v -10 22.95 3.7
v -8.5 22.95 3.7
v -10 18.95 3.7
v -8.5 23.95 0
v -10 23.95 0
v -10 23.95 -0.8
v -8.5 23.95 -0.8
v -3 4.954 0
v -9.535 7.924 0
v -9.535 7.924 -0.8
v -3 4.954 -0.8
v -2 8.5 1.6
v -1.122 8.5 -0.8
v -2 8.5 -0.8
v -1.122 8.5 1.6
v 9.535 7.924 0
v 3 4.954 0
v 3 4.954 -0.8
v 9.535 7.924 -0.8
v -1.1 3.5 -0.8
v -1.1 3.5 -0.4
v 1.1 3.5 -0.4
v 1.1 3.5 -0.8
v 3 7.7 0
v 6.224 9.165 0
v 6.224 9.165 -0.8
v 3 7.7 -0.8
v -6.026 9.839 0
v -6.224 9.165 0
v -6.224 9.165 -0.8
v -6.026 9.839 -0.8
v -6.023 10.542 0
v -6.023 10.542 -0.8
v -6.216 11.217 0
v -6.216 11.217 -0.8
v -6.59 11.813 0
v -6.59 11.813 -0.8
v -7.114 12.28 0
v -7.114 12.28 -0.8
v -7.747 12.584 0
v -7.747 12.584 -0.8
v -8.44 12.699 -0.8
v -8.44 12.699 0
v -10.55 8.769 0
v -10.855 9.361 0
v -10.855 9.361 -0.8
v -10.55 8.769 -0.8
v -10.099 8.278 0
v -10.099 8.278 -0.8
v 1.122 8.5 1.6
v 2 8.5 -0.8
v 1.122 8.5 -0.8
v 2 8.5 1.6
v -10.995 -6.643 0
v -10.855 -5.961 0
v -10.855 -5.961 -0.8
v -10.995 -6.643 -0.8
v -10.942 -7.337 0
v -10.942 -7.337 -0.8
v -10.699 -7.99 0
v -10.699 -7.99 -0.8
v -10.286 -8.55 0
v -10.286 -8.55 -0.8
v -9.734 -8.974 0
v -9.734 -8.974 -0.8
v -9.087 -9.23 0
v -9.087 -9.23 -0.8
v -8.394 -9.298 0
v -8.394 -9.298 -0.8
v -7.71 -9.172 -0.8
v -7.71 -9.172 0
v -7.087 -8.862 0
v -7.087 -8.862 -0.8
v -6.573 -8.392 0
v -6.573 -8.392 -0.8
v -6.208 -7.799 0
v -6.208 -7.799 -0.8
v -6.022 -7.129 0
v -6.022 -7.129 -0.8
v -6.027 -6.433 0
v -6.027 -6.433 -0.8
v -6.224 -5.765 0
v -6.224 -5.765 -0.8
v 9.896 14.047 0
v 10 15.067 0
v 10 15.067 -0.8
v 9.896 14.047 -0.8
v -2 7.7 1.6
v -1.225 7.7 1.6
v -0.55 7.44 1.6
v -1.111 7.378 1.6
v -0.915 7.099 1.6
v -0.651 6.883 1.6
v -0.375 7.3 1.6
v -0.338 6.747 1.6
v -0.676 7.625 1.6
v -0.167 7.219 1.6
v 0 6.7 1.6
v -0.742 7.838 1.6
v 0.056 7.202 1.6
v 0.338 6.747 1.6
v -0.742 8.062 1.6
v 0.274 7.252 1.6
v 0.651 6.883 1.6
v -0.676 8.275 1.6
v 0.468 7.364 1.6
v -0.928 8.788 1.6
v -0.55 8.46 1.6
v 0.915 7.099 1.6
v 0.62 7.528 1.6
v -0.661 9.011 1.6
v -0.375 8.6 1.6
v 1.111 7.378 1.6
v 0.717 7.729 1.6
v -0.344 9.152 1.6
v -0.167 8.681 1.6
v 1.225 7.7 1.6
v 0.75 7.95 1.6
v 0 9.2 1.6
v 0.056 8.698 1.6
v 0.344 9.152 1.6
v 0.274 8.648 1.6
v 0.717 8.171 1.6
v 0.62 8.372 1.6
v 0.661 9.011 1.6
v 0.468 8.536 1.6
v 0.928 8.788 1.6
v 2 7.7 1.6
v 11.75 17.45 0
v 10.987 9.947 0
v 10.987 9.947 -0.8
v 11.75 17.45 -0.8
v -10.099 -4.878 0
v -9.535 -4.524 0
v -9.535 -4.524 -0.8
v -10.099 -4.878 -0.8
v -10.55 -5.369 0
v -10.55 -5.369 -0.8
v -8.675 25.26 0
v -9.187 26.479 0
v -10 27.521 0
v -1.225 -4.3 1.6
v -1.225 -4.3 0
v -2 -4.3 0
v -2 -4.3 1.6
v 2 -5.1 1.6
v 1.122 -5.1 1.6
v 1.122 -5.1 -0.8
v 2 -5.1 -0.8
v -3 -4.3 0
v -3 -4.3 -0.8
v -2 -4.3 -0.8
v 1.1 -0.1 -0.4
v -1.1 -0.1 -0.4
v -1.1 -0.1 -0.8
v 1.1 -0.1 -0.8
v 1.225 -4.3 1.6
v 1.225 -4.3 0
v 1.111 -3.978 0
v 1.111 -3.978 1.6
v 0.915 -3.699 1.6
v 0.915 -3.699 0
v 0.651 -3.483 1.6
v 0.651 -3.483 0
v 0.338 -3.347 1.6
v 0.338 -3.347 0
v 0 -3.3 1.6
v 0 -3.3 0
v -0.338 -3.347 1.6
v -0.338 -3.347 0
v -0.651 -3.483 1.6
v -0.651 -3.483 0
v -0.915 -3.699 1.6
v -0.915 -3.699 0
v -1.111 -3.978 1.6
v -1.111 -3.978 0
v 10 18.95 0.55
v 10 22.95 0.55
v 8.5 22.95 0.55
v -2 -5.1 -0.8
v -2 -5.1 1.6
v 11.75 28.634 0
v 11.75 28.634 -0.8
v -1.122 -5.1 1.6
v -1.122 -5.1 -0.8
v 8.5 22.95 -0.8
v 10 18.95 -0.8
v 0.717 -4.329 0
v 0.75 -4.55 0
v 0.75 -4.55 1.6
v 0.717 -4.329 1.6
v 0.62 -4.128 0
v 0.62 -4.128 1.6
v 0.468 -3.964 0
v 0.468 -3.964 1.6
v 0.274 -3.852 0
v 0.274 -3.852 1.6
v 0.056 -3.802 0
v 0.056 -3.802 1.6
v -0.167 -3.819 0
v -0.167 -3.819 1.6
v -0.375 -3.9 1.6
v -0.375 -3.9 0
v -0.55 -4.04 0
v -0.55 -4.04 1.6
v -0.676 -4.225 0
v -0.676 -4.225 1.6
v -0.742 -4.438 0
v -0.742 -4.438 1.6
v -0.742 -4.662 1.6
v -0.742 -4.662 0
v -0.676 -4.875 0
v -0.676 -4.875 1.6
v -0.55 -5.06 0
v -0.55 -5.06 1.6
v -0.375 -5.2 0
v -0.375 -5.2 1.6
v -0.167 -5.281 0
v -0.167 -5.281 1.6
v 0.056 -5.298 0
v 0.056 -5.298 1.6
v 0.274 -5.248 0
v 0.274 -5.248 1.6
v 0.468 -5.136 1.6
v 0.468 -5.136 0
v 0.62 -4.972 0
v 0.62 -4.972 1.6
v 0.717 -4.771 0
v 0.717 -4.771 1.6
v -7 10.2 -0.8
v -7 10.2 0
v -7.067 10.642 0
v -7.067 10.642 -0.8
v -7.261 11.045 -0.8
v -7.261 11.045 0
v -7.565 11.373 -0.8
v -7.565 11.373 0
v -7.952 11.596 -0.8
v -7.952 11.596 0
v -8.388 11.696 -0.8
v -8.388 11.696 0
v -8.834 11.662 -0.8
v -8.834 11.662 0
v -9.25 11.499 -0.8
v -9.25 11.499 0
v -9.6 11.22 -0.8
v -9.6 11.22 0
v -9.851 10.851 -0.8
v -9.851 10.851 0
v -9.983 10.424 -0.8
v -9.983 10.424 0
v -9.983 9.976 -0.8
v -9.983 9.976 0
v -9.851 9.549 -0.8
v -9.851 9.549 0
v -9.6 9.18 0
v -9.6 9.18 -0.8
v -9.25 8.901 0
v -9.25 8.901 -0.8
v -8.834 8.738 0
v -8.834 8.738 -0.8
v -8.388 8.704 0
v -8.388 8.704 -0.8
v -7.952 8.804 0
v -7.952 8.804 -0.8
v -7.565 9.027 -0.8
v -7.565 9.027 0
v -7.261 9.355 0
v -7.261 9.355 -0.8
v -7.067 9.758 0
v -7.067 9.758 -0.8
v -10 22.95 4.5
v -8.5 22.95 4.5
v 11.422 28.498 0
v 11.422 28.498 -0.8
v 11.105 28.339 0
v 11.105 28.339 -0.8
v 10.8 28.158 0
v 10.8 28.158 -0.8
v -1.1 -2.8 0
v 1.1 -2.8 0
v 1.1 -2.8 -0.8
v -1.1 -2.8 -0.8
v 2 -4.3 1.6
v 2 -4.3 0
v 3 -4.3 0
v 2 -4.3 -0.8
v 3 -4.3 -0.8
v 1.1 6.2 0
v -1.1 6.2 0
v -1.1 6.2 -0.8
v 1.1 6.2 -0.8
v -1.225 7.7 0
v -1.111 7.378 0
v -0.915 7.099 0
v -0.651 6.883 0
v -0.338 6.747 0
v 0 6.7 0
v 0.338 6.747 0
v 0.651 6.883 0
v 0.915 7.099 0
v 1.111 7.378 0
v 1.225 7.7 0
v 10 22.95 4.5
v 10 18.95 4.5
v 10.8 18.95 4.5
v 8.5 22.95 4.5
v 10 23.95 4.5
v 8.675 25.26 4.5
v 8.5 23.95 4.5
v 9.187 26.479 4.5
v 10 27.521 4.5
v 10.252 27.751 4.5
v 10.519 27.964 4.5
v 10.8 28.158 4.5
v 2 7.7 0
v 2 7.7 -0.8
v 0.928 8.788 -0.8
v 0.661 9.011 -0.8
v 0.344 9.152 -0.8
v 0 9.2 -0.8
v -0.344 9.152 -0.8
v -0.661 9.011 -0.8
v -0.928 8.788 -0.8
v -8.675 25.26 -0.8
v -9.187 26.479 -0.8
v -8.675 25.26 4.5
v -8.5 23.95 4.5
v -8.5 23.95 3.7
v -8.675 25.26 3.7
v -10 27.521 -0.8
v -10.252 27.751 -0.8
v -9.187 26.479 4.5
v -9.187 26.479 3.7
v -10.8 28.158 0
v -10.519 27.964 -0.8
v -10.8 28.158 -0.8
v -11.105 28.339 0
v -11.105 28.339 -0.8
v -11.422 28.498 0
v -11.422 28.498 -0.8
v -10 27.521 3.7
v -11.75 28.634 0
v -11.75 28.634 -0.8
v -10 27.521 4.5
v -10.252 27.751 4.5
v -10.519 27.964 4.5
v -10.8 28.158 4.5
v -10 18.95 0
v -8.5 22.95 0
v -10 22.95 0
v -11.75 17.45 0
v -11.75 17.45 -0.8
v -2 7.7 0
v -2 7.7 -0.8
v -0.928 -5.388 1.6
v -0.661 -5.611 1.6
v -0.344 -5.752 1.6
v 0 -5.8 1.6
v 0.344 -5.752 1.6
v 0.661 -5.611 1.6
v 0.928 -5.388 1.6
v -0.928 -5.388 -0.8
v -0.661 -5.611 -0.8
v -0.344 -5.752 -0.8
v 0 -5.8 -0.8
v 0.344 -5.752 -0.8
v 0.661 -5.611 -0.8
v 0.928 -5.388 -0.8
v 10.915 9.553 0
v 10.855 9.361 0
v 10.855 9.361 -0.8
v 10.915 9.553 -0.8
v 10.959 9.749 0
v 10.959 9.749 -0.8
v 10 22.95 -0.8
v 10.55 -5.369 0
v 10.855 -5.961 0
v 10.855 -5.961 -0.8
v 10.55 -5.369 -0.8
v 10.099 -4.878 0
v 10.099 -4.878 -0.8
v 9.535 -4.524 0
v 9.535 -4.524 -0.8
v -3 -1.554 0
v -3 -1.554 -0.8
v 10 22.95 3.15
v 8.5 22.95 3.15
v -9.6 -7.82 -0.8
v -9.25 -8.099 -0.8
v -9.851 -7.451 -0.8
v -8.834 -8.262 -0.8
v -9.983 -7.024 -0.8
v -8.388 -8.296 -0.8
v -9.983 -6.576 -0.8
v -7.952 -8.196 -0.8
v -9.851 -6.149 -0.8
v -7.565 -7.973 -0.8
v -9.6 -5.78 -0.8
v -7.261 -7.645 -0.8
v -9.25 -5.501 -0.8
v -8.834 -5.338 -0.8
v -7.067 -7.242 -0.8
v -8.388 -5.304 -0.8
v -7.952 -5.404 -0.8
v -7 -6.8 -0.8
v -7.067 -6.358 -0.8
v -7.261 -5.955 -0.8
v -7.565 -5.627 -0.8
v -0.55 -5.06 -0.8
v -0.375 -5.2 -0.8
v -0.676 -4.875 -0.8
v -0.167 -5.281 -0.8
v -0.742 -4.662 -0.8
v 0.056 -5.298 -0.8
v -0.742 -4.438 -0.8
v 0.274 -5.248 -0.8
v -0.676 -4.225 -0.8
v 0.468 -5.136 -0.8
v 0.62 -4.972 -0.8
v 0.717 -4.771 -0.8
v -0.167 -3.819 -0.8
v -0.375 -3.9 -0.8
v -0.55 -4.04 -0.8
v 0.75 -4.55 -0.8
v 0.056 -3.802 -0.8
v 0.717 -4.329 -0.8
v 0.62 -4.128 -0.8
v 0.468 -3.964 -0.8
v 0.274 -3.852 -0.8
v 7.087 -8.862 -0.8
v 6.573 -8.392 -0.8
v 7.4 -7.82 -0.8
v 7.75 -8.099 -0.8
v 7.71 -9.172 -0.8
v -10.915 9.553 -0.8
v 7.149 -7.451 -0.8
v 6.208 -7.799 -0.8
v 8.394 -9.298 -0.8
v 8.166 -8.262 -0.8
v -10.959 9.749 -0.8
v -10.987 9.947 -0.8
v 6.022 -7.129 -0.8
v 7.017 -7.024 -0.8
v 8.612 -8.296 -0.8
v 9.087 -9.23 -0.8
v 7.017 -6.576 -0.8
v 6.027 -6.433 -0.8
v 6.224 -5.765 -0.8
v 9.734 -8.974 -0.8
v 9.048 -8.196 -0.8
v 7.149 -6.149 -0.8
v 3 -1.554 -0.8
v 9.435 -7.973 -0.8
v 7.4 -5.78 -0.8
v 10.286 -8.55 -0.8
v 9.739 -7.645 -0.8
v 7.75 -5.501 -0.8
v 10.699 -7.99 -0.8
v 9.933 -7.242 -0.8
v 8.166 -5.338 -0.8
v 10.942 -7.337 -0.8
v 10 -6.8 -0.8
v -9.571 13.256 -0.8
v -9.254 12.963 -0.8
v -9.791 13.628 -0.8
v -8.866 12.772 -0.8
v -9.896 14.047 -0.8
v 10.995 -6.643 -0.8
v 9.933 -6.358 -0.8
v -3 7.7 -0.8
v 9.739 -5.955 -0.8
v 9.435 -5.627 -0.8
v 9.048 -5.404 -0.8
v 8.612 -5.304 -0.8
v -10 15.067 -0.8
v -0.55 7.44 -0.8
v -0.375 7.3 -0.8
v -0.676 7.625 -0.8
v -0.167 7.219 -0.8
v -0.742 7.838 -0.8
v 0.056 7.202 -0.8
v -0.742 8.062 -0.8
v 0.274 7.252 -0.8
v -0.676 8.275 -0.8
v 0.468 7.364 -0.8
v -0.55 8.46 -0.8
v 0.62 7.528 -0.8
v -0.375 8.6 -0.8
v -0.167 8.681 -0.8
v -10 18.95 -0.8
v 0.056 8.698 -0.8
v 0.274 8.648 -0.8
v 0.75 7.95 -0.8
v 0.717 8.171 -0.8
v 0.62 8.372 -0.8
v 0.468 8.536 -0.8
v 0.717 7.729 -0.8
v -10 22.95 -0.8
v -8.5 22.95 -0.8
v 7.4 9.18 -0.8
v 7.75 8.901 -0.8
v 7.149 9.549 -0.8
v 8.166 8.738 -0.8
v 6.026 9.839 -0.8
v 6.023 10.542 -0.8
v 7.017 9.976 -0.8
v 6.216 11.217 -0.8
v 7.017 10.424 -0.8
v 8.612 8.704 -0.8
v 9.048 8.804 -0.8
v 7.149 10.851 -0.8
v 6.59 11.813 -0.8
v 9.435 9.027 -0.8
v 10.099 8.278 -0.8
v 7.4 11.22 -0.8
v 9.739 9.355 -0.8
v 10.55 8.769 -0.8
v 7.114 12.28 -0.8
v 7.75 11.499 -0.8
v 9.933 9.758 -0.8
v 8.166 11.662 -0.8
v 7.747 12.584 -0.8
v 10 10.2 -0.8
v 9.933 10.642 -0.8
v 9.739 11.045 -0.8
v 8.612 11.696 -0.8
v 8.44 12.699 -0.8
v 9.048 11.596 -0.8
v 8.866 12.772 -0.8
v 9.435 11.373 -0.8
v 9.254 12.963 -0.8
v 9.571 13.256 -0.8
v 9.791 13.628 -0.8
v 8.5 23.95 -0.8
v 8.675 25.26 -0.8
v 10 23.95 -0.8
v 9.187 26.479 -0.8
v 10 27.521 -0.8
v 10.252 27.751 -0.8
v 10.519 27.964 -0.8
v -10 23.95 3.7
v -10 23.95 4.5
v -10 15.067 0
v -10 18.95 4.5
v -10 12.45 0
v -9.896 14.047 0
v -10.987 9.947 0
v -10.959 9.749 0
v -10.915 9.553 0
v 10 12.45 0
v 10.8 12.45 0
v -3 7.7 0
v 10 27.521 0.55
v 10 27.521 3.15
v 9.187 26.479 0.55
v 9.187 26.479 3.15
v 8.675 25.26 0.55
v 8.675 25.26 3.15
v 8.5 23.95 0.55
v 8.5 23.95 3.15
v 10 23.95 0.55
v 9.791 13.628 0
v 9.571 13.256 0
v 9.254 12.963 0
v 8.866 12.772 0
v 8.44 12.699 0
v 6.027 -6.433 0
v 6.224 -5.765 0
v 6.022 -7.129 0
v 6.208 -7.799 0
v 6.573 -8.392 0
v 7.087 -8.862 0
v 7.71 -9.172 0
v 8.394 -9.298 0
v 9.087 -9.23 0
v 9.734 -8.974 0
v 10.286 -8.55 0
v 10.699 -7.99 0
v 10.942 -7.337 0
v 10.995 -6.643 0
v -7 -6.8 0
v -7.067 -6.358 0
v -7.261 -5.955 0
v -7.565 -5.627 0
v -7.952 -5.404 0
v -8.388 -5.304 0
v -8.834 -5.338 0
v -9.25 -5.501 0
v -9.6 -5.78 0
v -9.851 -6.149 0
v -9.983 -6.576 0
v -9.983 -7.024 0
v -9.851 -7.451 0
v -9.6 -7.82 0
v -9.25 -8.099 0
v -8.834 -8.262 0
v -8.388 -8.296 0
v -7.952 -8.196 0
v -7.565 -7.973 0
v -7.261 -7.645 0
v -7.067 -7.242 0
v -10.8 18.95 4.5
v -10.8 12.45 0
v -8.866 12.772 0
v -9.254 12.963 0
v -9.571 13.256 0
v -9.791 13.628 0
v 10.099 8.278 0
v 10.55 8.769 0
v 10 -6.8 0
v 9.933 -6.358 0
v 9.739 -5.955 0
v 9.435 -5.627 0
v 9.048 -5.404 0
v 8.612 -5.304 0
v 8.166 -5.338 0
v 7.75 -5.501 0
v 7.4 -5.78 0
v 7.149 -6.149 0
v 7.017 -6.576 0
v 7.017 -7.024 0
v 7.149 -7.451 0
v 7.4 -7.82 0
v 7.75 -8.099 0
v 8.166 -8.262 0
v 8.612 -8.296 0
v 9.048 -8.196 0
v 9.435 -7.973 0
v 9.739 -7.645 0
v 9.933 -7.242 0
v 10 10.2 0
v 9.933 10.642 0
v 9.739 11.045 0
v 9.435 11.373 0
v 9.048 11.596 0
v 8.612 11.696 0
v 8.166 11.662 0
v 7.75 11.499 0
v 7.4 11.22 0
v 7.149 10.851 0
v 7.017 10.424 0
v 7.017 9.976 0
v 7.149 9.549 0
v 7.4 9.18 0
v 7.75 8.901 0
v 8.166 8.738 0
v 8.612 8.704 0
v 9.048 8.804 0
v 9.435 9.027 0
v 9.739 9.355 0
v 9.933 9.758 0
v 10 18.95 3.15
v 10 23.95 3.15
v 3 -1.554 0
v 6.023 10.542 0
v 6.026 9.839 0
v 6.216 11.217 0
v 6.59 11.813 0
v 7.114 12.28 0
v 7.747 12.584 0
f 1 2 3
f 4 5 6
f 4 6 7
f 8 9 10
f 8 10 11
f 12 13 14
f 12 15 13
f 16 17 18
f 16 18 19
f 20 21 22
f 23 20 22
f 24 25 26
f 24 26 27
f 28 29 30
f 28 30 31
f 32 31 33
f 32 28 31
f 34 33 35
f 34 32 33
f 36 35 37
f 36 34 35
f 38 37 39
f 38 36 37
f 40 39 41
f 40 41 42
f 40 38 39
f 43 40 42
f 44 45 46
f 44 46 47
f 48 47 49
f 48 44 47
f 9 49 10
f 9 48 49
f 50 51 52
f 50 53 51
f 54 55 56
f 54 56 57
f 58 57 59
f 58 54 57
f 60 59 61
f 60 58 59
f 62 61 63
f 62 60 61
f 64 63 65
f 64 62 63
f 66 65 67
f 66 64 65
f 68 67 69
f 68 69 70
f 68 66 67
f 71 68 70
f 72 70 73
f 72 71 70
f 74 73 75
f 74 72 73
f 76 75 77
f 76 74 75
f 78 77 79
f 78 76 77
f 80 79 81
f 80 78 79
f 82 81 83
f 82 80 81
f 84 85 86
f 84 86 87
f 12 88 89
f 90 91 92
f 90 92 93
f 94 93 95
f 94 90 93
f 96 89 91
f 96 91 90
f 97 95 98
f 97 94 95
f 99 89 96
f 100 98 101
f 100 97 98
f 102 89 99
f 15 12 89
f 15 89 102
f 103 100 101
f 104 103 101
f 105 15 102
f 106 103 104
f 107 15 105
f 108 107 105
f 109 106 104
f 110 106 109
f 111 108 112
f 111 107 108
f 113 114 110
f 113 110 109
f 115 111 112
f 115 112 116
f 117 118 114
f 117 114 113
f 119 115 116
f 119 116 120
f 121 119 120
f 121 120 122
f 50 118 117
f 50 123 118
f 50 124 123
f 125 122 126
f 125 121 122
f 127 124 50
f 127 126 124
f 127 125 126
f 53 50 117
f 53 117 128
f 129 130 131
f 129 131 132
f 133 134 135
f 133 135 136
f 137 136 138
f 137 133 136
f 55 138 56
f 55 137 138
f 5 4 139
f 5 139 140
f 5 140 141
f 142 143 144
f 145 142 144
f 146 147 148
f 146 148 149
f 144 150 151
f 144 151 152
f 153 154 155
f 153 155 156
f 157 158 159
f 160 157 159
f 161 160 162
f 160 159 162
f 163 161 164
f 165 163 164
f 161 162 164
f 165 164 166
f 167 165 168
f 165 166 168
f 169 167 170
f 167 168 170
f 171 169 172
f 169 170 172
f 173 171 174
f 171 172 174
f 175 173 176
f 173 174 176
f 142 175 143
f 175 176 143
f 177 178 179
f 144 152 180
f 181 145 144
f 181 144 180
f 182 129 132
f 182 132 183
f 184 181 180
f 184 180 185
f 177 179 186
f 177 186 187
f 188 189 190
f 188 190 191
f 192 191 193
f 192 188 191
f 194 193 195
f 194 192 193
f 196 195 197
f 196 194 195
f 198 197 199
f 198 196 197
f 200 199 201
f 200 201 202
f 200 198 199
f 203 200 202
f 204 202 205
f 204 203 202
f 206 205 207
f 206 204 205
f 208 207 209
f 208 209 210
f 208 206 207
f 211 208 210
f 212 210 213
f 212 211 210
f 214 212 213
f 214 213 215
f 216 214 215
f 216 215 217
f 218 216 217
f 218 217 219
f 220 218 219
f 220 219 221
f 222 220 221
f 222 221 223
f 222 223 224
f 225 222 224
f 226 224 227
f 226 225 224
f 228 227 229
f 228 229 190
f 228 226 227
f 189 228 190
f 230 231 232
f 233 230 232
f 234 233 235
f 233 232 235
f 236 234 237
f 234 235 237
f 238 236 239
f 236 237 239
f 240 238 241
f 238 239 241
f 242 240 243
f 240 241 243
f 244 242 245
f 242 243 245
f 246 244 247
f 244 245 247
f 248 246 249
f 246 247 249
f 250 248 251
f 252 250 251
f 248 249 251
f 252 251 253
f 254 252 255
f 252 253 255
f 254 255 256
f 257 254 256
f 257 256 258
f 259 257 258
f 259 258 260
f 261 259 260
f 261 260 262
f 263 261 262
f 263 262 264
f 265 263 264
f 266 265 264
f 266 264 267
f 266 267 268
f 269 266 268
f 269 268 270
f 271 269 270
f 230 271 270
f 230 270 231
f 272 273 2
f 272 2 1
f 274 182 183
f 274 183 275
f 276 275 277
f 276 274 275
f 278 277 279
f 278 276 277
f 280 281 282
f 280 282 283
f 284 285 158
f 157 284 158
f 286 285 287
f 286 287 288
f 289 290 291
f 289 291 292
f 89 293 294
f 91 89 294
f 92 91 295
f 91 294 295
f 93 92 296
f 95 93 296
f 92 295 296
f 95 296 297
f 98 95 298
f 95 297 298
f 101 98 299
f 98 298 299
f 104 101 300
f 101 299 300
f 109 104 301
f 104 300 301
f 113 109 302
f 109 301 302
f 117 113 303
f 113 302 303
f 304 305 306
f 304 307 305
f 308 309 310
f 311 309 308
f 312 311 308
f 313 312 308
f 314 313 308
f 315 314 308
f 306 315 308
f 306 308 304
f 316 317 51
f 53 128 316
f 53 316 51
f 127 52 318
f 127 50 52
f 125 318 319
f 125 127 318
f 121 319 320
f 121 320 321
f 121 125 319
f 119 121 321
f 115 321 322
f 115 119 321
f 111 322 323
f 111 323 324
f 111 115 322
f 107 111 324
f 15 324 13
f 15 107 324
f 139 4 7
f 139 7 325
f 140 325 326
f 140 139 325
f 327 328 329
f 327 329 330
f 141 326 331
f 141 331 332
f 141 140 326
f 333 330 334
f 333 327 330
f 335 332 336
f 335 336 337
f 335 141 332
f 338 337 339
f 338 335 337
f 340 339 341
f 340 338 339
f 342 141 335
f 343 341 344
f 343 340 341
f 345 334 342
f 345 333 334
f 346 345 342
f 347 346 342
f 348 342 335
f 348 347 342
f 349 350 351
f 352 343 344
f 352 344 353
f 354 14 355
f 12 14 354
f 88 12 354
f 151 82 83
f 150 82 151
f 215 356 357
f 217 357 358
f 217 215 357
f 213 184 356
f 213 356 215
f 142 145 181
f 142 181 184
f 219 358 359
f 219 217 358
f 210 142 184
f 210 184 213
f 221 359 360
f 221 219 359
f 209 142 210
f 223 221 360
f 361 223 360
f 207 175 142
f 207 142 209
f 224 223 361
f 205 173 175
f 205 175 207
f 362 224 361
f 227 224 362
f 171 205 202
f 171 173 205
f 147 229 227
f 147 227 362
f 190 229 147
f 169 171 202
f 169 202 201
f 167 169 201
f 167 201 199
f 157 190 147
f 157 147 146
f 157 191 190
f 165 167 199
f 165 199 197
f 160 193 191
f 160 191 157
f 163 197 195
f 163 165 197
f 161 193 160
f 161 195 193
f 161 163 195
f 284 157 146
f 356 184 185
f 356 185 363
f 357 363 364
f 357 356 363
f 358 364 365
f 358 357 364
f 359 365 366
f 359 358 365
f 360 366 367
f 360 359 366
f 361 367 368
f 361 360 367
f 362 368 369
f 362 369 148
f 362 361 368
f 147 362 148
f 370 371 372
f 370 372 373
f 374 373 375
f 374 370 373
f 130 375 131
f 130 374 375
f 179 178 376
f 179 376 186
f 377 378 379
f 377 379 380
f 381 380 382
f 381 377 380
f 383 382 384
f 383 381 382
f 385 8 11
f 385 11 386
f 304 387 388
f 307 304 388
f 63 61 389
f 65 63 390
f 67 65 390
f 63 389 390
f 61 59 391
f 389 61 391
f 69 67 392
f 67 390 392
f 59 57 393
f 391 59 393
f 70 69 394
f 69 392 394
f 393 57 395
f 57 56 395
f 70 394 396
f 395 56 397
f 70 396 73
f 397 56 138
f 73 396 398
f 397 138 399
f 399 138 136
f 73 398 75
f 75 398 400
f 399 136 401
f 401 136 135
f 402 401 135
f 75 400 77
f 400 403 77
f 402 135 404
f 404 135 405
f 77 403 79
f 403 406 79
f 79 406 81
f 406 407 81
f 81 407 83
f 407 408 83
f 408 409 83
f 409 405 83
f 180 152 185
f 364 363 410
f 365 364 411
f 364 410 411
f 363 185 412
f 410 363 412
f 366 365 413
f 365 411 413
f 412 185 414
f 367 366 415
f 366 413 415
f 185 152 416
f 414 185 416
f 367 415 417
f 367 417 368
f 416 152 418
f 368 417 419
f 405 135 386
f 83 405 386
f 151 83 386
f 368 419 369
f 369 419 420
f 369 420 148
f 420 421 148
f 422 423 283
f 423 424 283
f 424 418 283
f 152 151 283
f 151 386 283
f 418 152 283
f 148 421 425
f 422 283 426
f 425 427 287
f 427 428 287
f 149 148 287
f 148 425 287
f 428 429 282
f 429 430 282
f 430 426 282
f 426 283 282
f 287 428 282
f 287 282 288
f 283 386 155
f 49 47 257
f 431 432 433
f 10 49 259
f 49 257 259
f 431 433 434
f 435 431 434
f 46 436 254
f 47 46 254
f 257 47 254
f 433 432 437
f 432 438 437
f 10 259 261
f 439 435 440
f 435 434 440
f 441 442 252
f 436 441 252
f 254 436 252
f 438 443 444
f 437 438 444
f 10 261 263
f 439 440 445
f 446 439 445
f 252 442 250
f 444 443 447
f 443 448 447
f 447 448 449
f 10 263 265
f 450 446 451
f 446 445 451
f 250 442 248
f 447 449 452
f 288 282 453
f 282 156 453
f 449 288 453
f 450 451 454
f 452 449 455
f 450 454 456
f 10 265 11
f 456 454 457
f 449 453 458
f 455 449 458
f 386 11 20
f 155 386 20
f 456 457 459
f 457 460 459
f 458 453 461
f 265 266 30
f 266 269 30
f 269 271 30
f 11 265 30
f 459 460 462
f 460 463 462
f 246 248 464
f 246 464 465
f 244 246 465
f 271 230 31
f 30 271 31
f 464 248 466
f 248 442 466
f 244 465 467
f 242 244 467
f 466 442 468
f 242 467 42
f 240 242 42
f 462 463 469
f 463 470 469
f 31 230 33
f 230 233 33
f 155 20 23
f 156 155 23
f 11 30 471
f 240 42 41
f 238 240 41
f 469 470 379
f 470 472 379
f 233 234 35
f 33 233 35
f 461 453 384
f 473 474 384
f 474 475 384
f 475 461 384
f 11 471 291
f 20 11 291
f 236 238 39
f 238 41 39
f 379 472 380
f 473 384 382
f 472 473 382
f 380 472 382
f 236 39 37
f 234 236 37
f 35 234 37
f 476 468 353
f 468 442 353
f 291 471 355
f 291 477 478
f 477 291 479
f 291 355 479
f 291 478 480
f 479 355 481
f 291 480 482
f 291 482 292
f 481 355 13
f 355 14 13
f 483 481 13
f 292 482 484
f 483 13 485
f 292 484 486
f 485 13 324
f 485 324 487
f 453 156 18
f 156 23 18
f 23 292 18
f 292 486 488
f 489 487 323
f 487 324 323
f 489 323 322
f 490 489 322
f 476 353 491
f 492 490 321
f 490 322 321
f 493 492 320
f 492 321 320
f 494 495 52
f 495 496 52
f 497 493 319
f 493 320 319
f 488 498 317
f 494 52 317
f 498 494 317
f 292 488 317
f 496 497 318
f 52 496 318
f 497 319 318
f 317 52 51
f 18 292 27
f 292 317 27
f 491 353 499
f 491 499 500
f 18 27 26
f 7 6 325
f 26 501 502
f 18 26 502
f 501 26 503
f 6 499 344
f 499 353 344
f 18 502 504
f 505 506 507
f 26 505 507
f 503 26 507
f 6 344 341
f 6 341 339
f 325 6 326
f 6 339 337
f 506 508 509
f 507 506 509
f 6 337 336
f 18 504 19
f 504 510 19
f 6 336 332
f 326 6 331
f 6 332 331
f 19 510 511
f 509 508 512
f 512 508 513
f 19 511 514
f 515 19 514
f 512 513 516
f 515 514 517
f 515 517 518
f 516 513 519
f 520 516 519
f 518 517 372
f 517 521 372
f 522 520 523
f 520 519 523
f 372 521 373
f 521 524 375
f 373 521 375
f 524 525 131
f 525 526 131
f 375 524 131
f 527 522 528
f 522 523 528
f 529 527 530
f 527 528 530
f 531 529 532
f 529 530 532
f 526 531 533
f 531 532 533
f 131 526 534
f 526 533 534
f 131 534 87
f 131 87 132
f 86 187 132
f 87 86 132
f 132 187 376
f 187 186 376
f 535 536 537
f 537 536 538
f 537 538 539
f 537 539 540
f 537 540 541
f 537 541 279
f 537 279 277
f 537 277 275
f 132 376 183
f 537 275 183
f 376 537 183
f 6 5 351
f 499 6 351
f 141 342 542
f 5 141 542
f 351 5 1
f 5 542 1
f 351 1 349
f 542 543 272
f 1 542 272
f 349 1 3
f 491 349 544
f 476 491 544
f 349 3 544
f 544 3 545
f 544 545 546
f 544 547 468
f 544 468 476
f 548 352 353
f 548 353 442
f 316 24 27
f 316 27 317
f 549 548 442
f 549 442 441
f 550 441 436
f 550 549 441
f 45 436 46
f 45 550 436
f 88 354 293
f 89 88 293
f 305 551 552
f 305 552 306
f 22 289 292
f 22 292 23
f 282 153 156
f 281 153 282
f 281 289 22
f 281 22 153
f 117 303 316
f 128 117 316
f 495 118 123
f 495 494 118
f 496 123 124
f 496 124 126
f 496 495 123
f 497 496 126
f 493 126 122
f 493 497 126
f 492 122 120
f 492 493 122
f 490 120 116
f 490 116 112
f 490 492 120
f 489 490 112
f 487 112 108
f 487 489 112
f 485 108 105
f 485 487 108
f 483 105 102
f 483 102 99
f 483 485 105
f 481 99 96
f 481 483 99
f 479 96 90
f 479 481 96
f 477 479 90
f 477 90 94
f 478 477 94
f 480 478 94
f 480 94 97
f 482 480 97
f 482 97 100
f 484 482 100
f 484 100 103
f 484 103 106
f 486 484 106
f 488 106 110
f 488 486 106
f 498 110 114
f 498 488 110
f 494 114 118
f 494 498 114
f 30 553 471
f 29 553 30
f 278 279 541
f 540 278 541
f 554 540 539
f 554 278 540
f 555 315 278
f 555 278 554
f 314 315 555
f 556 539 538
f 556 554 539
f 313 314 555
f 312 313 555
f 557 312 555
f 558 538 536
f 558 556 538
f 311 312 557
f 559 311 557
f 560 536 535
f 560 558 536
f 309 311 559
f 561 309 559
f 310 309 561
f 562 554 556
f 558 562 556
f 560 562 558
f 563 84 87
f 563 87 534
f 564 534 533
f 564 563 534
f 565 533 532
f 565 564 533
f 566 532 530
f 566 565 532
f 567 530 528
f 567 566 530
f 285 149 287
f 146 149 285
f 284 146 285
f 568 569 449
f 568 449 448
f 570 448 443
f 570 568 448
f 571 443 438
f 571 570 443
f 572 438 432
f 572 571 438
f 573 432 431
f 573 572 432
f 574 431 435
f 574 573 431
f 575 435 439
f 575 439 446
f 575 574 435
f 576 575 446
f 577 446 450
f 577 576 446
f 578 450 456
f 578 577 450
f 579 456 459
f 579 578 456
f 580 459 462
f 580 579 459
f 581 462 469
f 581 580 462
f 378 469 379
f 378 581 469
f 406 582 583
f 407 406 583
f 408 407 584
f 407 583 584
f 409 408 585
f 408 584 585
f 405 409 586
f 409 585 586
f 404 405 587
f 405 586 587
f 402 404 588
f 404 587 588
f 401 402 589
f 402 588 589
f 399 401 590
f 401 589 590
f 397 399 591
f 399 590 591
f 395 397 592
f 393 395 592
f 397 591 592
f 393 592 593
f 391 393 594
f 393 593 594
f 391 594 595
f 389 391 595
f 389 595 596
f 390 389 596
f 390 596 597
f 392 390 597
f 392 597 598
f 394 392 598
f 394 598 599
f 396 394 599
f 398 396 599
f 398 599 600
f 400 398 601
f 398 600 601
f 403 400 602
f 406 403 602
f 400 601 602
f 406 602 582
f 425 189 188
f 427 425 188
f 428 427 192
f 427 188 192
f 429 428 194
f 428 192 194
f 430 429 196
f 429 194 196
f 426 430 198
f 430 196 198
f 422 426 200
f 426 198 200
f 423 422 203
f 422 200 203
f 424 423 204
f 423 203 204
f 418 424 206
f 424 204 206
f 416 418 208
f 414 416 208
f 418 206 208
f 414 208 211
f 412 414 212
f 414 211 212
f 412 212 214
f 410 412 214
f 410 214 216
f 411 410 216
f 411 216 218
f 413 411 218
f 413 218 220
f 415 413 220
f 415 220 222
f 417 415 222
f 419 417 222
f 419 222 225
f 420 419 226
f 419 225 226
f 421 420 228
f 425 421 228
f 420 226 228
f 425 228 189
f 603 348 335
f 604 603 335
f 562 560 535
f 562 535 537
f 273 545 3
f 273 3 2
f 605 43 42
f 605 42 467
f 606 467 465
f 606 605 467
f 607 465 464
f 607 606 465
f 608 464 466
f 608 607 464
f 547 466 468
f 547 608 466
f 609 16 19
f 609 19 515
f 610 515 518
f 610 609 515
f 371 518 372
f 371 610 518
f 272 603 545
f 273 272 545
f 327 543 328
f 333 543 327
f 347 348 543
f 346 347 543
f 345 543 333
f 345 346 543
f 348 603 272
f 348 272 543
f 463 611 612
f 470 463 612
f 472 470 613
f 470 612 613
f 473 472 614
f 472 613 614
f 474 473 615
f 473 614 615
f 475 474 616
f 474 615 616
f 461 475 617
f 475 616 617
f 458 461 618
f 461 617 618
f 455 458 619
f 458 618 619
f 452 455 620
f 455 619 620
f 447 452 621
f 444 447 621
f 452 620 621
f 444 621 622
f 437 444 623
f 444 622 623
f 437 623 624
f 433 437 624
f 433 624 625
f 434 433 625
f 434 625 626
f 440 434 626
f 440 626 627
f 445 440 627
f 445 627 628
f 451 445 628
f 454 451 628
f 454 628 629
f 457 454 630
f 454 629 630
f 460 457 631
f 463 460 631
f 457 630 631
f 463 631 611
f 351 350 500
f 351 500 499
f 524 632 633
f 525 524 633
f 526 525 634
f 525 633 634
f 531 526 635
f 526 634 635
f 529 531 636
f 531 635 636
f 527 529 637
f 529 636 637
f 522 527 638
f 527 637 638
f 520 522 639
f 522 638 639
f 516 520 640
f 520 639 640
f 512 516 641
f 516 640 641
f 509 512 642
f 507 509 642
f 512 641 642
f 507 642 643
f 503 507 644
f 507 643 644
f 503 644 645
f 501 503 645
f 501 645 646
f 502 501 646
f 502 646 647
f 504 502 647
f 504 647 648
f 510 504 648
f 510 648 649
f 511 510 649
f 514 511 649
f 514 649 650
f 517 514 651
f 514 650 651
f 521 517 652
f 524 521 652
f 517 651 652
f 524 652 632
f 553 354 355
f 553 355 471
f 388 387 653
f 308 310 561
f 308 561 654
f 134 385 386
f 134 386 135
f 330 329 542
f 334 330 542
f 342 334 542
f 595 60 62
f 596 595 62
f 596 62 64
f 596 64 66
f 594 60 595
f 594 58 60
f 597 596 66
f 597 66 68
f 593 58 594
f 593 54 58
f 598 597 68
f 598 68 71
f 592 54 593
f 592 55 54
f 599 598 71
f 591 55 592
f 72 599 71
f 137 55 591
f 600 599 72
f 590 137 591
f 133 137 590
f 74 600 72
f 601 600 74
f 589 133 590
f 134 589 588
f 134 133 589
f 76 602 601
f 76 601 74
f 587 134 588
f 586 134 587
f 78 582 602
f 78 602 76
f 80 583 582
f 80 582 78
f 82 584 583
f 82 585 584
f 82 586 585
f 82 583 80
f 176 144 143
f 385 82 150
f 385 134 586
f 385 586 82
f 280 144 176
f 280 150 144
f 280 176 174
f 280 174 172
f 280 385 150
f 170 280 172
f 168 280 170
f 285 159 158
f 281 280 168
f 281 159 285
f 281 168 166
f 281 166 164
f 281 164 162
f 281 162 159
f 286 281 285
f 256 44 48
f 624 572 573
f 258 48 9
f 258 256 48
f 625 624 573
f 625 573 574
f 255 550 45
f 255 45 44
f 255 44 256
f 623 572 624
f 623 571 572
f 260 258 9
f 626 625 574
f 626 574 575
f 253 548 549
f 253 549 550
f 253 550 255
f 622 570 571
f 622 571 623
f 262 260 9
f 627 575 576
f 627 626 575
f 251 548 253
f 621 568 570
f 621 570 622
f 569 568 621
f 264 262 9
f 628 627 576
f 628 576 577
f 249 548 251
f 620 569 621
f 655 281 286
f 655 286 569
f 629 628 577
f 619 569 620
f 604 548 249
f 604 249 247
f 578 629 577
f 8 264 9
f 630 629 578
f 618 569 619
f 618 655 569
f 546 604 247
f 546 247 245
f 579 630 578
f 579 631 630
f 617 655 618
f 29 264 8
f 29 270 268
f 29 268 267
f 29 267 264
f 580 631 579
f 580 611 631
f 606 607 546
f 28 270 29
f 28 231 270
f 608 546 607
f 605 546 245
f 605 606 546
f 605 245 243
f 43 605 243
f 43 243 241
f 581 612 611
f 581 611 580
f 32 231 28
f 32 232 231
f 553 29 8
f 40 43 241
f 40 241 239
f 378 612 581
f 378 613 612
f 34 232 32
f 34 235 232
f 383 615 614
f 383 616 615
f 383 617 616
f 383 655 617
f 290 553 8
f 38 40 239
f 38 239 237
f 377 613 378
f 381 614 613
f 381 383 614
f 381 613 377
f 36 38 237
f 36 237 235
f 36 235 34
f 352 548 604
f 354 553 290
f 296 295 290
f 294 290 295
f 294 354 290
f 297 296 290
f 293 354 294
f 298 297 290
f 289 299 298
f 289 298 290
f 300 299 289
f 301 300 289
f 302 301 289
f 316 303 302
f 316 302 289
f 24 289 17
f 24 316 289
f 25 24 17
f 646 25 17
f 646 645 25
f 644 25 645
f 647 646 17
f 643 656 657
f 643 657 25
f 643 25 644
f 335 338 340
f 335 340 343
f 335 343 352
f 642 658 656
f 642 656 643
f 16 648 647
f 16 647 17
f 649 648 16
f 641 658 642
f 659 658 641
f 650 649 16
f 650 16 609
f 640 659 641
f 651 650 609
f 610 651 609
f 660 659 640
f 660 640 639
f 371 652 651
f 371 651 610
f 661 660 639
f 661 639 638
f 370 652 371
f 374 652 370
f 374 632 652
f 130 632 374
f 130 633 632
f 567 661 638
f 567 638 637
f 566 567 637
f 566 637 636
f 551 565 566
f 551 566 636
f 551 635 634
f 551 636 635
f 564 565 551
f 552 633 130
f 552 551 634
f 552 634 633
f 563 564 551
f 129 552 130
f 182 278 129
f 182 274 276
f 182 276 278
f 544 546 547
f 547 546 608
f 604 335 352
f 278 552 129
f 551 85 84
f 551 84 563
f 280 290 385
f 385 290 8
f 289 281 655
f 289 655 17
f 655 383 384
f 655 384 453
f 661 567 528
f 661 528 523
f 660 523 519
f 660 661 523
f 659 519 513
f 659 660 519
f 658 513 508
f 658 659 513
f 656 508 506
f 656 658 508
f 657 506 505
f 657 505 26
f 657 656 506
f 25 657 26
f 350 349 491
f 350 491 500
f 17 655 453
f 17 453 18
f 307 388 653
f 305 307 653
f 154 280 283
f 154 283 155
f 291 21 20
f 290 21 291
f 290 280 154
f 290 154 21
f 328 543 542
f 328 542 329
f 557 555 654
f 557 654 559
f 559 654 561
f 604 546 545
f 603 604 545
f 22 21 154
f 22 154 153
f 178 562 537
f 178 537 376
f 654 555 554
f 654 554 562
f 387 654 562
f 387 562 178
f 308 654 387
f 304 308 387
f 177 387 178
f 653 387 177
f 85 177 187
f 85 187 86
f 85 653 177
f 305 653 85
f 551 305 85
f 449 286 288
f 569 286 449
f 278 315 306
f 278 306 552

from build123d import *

# Parameters (mm, degrees)
F0_W          = 2.2
F0_H          = 3.6
F1_DEPTH      = 0.8
F0_R          = 0.75
F2_DEPTH      = 1.6
F2_DEPTH_BACK = 0.8
F3_DEPTH      = 0.4
F0_R_2        = 1.5
F4_DEPTH      = 0.8
F5_DEPTH      = 4.5
F5_DEPTH_BACK = 0.8
F6_W          = 1.5
F6_H          = 3.7
F6_H_2        = 2.6
F7_DEPTH      = 25
F7_DEPTH_BACK = 25
F9_DEPTH      = 0.8


# Not quite as in the source:
# - a feature of the source that left no trace in its solid (it failed there, or was rolled back) is left out
# - a pattern or mirror of a feature is missing from the dataset's text; its kind, count and spacing are read off the source's solid


with BuildPart() as f1:
    # F0 (on Top) → F1 (new body)
    with BuildSketch(Plane.XY):
        with BuildLine():
            Line((2, 7.6999996733), (1.2247448714, 7.6999996733))
            ThreePointArc((1.2247448714, 7.6999996733), (0, 6.6999996733), (-1.2247448714, 7.6999996733))
            Line((-1.2247448714, 7.6999996733), (-2, 7.6999996733))
            Line((-2, 7.6999996733), (-3, 7.6999996733))
            Line((-3, 7.6999996733), (-6.2240838063, 9.1654923125))
            ThreePointArc((-6.2240838063, 9.1654923125), (-7.622191396, 7.8591767294), (-9.5345073608, 7.9240834796))
            Line((-9.5345073608, 7.9240834796), (-3, 4.9538528611))
            Line((-3, 4.9538528611), (-3, -1.5538535145))
            Line((-3, -1.5538535145), (-9.5345073608, -4.5240841331))
            ThreePointArc((-9.5345073608, -4.5240841331), (-7.622191396, -4.4591773828), (-6.2240838063, -5.765492966))
            Line((-6.2240838063, -5.765492966), (-3, -4.3000003267))
            Line((-3, -4.3000003267), (-2, -4.3000003267))
            Line((-2, -4.3000003267), (-1.2247448714, -4.3000003267))
            ThreePointArc((-1.2247448714, -4.3000003267), (0, -3.3000003267), (1.2247448714, -4.3000003267))
            Line((1.2247448714, -4.3000003267), (2, -4.3000003267))
            Line((2, -4.3000003267), (3, -4.3000003267))
            Line((3, -4.3000003267), (6.2240838063, -5.765492966))
            ThreePointArc((6.2240838063, -5.765492966), (7.622191396, -4.4591773828), (9.5345073608, -4.5240841331))
            Line((9.5345073608, -4.5240841331), (3, -1.5538535145))
            Line((3, -1.5538535145), (3, 4.9538528611))
            Line((3, 4.9538528611), (9.5345073608, 7.9240834796))
            ThreePointArc((9.5345073608, 7.9240834796), (7.622191396, 7.8591767294), (6.2240838063, 9.1654923125))
            Line((6.2240838063, 9.1654923125), (3, 7.6999996733))
            Line((3, 7.6999996733), (2, 7.6999996733))
        make_face()
        Polygon((-1.1, 3.4999996733), (-1.1, 6.1999996733), (1.1, 6.1999996733), (1.1, 3.4999996733), (1.1, -0.1000003267), (1.1, -2.8000003267), (-1.1, -2.8000003267), (-1.1, -0.1000003267), align=None, mode=Mode.SUBTRACT)
        with Locations((0, 1.6999996733)):
            Rectangle(F0_W, F0_H)
    extrude(amount=-F1_DEPTH)

    # F0 (on Top) → F2 (join, two sides)
    with BuildSketch(Plane.XY) as f2_sk:
        with BuildLine():
            ThreePointArc((-1.2247448714, 7.6999996733), (-1.2399138495, 8.1084725282), (-1.122497216, 8.4999996733))
            Line((-1.122497216, 8.4999996733), (-2, 8.4999996733))
            Line((-2, 8.4999996733), (-2, 7.6999996733))
            Line((-2, 7.6999996733), (-1.2247448714, 7.6999996733))
        make_face()
        with BuildLine():
            ThreePointArc((1.2247448714, 7.6999996733), (1.2436701913, 7.8243634708), (1.25, 7.9499996733))
            ThreePointArc((1.25, 7.9499996733), (1.2177071733, 8.2322924999), (1.122497216, 8.4999996733))
            ThreePointArc((1.122497216, 8.4999996733), (0, 9.1999996733), (-1.122497216, 8.4999996733))
            ThreePointArc((-1.122497216, 8.4999996733), (-1.2399138495, 8.1084725282), (-1.2247448714, 7.6999996733))
            ThreePointArc((-1.2247448714, 7.6999996733), (0, 6.6999996733), (1.2247448714, 7.6999996733))
        make_face()
        with Locations((0, 7.9499996733)):
            Circle(F0_R, mode=Mode.SUBTRACT)
        with BuildLine():
            ThreePointArc((1.122497216, 8.4999996733), (1.2177071733, 8.2322924999), (1.25, 7.9499996733))
            ThreePointArc((1.25, 7.9499996733), (1.2436701913, 7.8243634708), (1.2247448714, 7.6999996733))
            Line((1.2247448714, 7.6999996733), (2, 7.6999996733))
            Line((2, 7.6999996733), (2, 8.4999996733))
            Line((2, 8.4999996733), (1.122497216, 8.4999996733))
        make_face()
        with BuildLine():
            Line((-1.2247448714, -4.3000003267), (-2, -4.3000003267))
            Line((-2, -4.3000003267), (-2, -5.1000003267))
            Line((-2, -5.1000003267), (-1.122497216, -5.1000003267))
            ThreePointArc((-1.122497216, -5.1000003267), (-1.2399138495, -4.7084731817), (-1.2247448714, -4.3000003267))
        make_face()
        with BuildLine():
            ThreePointArc((1.25, -4.5500003267), (1.2436701913, -4.4243641242), (1.2247448714, -4.3000003267))
            ThreePointArc((1.2247448714, -4.3000003267), (0, -3.3000003267), (-1.2247448714, -4.3000003267))
            ThreePointArc((-1.2247448714, -4.3000003267), (-1.2399138495, -4.7084731817), (-1.122497216, -5.1000003267))
            ThreePointArc((-1.122497216, -5.1000003267), (0, -5.8000003267), (1.122497216, -5.1000003267))
            ThreePointArc((1.122497216, -5.1000003267), (1.2177071733, -4.8322931534), (1.25, -4.5500003267))
        make_face()
        with Locations((0, -4.5500003267)):
            Circle(F0_R, mode=Mode.SUBTRACT)
        with BuildLine():
            Line((2, -5.1000003267), (2, -4.3000003267))
            Line((2, -4.3000003267), (1.2247448714, -4.3000003267))
            ThreePointArc((1.2247448714, -4.3000003267), (1.2436701913, -4.4243641242), (1.25, -4.5500003267))
            ThreePointArc((1.25, -4.5500003267), (1.2177071733, -4.8322931534), (1.122497216, -5.1000003267))
            Line((1.122497216, -5.1000003267), (2, -5.1000003267))
        make_face()
    extrude(amount=F2_DEPTH)
    extrude(f2_sk.sketch, amount=-F2_DEPTH_BACK)

    # F0 (on Top) → F3 (cut)
    with BuildSketch(Plane.XY):
        with Locations((0, 1.6999996733)):
            Rectangle(F0_W, F0_H)
    extrude(amount=-F3_DEPTH, mode=Mode.SUBTRACT)

    # F0 (on Top) → F4 (join)
    with BuildSketch(Plane.XY):
        with BuildLine():
            ThreePointArc((-9.5345073608, 7.9240834796), (-7.622191396, 7.8591767294), (-6.2240838063, 9.1654923125))
            ThreePointArc((-6.2240838063, 9.1654923125), (-6.3819707707, 11.5281382895), (-8.4399923541, 12.699279386))
            ThreePointArc((-8.4399923541, 12.699279386), (-10.3347684576, 11.8981235519), (-10.987178172, 9.9471266996))
            ThreePointArc((-10.987178172, 9.9471266996), (-10.9388236249, 9.6503276559), (-10.8551830715, 9.3614815161))
            ThreePointArc((-10.8551830715, 9.3614815161), (-10.3409314451, 8.5085590404), (-9.5345073608, 7.9240834796))
        make_face()
        with Locations((-8.5, 10.1999996733)):
            Circle(F0_R_2, mode=Mode.SUBTRACT)
        with BuildLine():
            ThreePointArc((8.4399923541, 12.699279386), (6.3819707707, 11.5281382895), (6.2240838063, 9.1654923125))
            ThreePointArc((6.2240838063, 9.1654923125), (7.622191396, 7.8591767294), (9.5345073608, 7.9240834796))
            ThreePointArc((9.5345073608, 7.9240834796), (10.3409314451, 8.5085590404), (10.8551830715, 9.3614815161))
            ThreePointArc((10.8551830715, 9.3614815161), (10.9388236249, 9.6503276559), (10.987178172, 9.9471266996))
            ThreePointArc((10.987178172, 9.9471266996), (10.3347684576, 11.8981235519), (8.4399923541, 12.699279386))
        make_face()
        with Locations((8.5, 10.1999996733)):
            Circle(F0_R_2, mode=Mode.SUBTRACT)
        with BuildLine():
            ThreePointArc((-6.2240838063, -5.765492966), (-7.622191396, -4.4591773828), (-9.5345073608, -4.5240841331))
            ThreePointArc((-9.5345073608, -4.5240841331), (-10.3409314451, -5.1085596938), (-10.8551830715, -5.9614821695))
            ThreePointArc((-10.8551830715, -5.9614821695), (-8.394294033, -9.2977645767), (-6.2240838063, -5.765492966))
        make_face()
        with Locations((-8.5, -6.8000003267)):
            Circle(F0_R_2, mode=Mode.SUBTRACT)
        with BuildLine():
            ThreePointArc((10.8551830715, -5.9614821695), (10.3409314451, -5.1085596938), (9.5345073608, -4.5240841331))
            ThreePointArc((9.5345073608, -4.5240841331), (7.622191396, -4.4591773828), (6.2240838063, -5.765492966))
            ThreePointArc((6.2240838063, -5.765492966), (8.394294033, -9.2977645767), (10.8551830715, -5.9614821695))
        make_face()
        with Locations((8.5, -6.8000003267)):
            Circle(F0_R_2, mode=Mode.SUBTRACT)
        with BuildLine():
            ThreePointArc((-10.987178172, 9.9471266996), (-10.3347684576, 11.8981235519), (-8.4399923541, 12.699279386))
            ThreePointArc((-8.4399923541, 12.699279386), (-9.4228620937, 13.0979861391), (-9.8962946697, 14.0471234295))
            Line((-9.8962946697, 14.0471234295), (-10, 15.0671360866))
            Line((-10, 15.0671360866), (-10, 18.9499996733))
            Line((-10, 18.9499996733), (-10.8, 18.9499996733))
            Line((-10.8, 18.9499996733), (-10.8, 28.1583247558))
            ThreePointArc((-10.8, 28.1583247558), (-11.2623378592, 28.4213381914), (-11.75, 28.6337481721))
            Line((-11.75, 28.6337481721), (-11.75, 17.4499996733))
            Line((-11.75, 17.4499996733), (-10.987178172, 9.9471266996))
        make_face()
        with BuildLine():
            ThreePointArc((9.8962946697, 14.0471234295), (9.4228620937, 13.0979861391), (8.4399923541, 12.699279386))
            ThreePointArc((8.4399923541, 12.699279386), (10.3347684576, 11.8981235519), (10.987178172, 9.9471266996))
            Line((10.987178172, 9.9471266996), (11.75, 17.4499996733))
            Line((11.75, 17.4499996733), (11.75, 28.6337481721))
            ThreePointArc((11.75, 28.6337481721), (11.2623378592, 28.4213381914), (10.8, 28.1583247558))
            Line((10.8, 28.1583247558), (10.8, 18.9499996733))
            Line((10.8, 18.9499996733), (10, 18.9499996733))
            Line((10, 18.9499996733), (10, 15.0671360866))
            Line((10, 15.0671360866), (9.8962946697, 14.0471234295))
        make_face()
    extrude(amount=-F4_DEPTH)

    # F0 (on Top) → F5 (join, two sides)
    with BuildSketch(Plane.XY) as f5_sk:
        with BuildLine():
            Line((-10.8, 18.9499996733), (-10, 18.9499996733))
            Line((-10, 18.9499996733), (-10, 22.9499996733))
            Line((-10, 22.9499996733), (-10, 23.9499996733))
            Line((-10, 23.9499996733), (-10, 27.5207138876))
            ThreePointArc((-10, 27.5207138876), (-10.383650067, 27.860033317), (-10.8, 28.1583247558))
            Line((-10.8, 28.1583247558), (-10.8, 18.9499996733))
        make_face()
        Polygon((-10, 22.9499996733), (-10, 18.9499996733), (-8.5, 22.9499996733), align=None)
        with BuildLine():
            ThreePointArc((-8.5, 23.9499996733), (-8.8902277714, 25.8864913464), (-10, 27.5207138876))
            Line((-10, 27.5207138876), (-10, 23.9499996733))
            Line((-10, 23.9499996733), (-8.5, 23.9499996733))
        make_face()
        with BuildLine():
            Line((10, 22.9499996733), (10, 18.9499996733))
            Line((10, 18.9499996733), (10.8, 18.9499996733))
            Line((10.8, 18.9499996733), (10.8, 28.1583247558))
            ThreePointArc((10.8, 28.1583247558), (10.383650067, 27.860033317), (10, 27.5207138876))
            Line((10, 27.5207138876), (10, 23.9499996733))
            Line((10, 23.9499996733), (10, 22.9499996733))
        make_face()
        Polygon((8.5, 22.9499996733), (10, 18.9499996733), (10, 22.9499996733), align=None)
        with BuildLine():
            Line((10, 23.9499996733), (10, 27.5207138876))
            ThreePointArc((10, 27.5207138876), (8.8902277714, 25.8864913464), (8.5, 23.9499996733))
            Line((8.5, 23.9499996733), (10, 23.9499996733))
        make_face()
    extrude(amount=F5_DEPTH)
    extrude(f5_sk.sketch, amount=-F5_DEPTH_BACK)

    # F6 (on face) → F7 (cut, two sides)
    with BuildSketch(Plane(origin=(0, 22.9499996733, 0), x_dir=(-1, 0, 0), z_dir=(0, 1, 0))) as f7_sk:
        with Locations((9.25, 1.85)):
            Rectangle(F6_W, F6_H)
        with Locations((-9.25, 1.85)):
            Rectangle(F6_W, F6_H_2)
    extrude(amount=-F7_DEPTH, mode=Mode.SUBTRACT)
    extrude(f7_sk.sketch, amount=F7_DEPTH_BACK, mode=Mode.SUBTRACT)

    # F8 (on face) → F9 (join)
    with BuildSketch(Plane(origin=(10, 0, 0), x_dir=(0, -1, 0), z_dir=(-1, 0, 0))):
        Polygon((-12.4499996733, 0), (-18.9499996733, 4.5), (-18.9499996733, 0), align=None)
    f9 = extrude(amount=-F9_DEPTH)

    # F9_copies: F9 across plane
    add(f9.mirror(Plane(origin=(0, 0, 0), x_dir=(0, 0, -1), z_dir=(-1, 0, 0))))


solid = f1.part
